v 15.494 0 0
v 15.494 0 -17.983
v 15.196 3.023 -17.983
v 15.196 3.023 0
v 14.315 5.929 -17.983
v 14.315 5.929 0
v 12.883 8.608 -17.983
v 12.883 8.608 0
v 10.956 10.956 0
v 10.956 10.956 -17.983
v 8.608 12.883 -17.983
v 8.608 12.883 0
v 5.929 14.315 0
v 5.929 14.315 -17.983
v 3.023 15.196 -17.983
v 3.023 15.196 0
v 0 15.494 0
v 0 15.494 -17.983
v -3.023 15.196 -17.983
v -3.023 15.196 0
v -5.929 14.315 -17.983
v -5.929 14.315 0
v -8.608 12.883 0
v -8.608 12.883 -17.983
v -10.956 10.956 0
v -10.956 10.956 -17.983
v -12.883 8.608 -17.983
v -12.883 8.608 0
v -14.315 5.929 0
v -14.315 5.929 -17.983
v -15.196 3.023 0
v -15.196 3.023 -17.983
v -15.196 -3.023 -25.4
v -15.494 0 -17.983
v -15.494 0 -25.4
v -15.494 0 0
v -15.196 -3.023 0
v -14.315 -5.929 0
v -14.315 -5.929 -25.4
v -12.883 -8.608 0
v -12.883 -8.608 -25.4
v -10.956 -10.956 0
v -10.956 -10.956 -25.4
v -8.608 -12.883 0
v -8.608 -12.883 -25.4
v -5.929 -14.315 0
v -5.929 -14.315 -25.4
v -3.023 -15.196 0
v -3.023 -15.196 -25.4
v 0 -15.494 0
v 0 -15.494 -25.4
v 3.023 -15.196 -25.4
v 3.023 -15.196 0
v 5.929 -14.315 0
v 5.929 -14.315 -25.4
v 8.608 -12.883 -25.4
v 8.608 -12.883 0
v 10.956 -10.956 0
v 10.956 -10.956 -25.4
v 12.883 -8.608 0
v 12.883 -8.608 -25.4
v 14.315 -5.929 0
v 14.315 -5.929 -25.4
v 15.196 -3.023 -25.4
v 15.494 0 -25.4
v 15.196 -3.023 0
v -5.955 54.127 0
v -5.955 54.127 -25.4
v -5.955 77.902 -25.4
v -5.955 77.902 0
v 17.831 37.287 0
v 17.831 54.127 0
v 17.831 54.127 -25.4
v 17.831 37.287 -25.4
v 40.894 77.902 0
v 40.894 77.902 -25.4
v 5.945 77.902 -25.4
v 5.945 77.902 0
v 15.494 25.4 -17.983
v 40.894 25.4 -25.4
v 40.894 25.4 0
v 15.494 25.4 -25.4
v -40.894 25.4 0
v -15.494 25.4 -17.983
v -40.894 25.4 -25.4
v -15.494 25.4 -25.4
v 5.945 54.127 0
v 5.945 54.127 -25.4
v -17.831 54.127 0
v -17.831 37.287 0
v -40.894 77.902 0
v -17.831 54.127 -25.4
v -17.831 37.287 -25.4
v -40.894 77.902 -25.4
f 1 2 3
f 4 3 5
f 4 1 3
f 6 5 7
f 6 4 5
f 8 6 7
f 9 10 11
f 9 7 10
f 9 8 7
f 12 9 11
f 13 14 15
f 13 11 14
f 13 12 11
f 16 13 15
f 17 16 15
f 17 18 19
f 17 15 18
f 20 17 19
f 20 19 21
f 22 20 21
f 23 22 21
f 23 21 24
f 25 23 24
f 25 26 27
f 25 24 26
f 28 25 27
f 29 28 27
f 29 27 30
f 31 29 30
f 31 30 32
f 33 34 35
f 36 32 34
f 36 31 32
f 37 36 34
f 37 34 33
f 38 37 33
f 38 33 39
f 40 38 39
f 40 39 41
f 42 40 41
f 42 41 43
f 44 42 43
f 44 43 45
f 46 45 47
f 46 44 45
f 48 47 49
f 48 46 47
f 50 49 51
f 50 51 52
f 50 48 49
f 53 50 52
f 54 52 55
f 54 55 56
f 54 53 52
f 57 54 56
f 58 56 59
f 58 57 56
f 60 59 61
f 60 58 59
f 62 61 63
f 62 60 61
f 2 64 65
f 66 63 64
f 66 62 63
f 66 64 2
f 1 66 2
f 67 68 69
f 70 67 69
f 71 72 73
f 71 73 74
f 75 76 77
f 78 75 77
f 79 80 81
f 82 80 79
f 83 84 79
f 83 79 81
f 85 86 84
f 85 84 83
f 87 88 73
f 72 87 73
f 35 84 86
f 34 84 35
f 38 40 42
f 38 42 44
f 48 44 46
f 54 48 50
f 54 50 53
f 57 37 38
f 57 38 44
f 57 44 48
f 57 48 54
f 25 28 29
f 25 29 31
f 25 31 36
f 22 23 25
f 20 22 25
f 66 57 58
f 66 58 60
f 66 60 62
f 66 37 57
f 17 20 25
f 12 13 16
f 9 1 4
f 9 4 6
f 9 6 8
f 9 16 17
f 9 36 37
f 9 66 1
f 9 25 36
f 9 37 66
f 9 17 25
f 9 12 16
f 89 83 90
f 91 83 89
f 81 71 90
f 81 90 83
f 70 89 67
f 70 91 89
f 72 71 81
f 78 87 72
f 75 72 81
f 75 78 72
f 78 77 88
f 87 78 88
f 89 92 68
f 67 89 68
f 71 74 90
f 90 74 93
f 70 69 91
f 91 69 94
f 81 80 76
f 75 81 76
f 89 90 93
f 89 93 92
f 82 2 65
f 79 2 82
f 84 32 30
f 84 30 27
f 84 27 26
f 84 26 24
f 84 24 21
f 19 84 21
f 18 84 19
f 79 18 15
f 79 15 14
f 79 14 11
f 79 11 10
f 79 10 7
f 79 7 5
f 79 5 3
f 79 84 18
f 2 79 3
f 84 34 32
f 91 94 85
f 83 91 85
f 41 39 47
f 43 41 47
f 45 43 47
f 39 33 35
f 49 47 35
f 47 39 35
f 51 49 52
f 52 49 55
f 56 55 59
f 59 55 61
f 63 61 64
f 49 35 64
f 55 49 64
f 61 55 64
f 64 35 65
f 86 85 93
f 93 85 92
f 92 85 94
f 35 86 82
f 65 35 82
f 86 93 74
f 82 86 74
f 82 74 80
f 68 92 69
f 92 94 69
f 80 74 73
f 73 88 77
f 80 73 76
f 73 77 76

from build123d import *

# Parameters (mm, degrees)
SKETCH1_R           = 15.494
BOSS_EXTRUDE1_DEPTH = 25.4
BOSS_EXTRUDE2_START = -7.4168
BOSS_EXTRUDE2_DEPTH = 7.4168
BOSS_EXTRUDE4_DEPTH = 25.4
CUT_EXTRUDE1_DEPTH  = 92.576032231


with BuildPart() as part:
    # Sketch1 → Boss-Extrude1 (new body)
    with BuildSketch(Plane.XY):
        Circle(SKETCH1_R)
    extrude(amount=-BOSS_EXTRUDE1_DEPTH)

    # Sketch2 → Boss-Extrude2 (add)
    with BuildSketch(Plane(origin=(0, 0, -25.4), x_dir=(-1, 0, 0), z_dir=(0, 0, -1)).offset(BOSS_EXTRUDE2_START)):
        with BuildLine():
            Line((-15.494, 0), (-15.494, 25.4))
            Line((-15.494, 25.4), (15.494, 25.4))
            Line((15.494, 25.4), (15.494, 0))
            ThreePointArc((15.494, 0), (0, 15.494), (-15.494, 0))
        make_face()
    extrude(amount=BOSS_EXTRUDE2_DEPTH)

    # Sketch3 → Boss-Extrude4 (add)
    with BuildSketch(Plane(origin=(0, 0, -25.4), x_dir=(-1, 0, 0), z_dir=(0, 0, -1))):
        Polygon((-15.494, 25.4), (-40.894, 25.4), (-40.894, 77.9018), (40.894, 77.9018), (40.894, 25.4), (15.494, 25.4), align=None)
    extrude(amount=-BOSS_EXTRUDE4_DEPTH)

    # Sketch4 → Cut-Extrude1 (cut, through all)
    with BuildSketch(Plane(origin=(0, 0, -25.4), x_dir=(-1, 0, 0), z_dir=(0, 0, -1))):
        Polygon((-5.94478872, 77.9018), (-5.94478872, 54.1274), (-17.8308, 54.1274), (-17.8308, 37.2872), (17.8308, 37.2872), (17.8308, 54.1274), (5.9554872, 54.1274), (5.9554872, 77.9018), align=None)
    extrude(amount=-CUT_EXTRUDE1_DEPTH, mode=Mode.SUBTRACT)


solid = part.part
